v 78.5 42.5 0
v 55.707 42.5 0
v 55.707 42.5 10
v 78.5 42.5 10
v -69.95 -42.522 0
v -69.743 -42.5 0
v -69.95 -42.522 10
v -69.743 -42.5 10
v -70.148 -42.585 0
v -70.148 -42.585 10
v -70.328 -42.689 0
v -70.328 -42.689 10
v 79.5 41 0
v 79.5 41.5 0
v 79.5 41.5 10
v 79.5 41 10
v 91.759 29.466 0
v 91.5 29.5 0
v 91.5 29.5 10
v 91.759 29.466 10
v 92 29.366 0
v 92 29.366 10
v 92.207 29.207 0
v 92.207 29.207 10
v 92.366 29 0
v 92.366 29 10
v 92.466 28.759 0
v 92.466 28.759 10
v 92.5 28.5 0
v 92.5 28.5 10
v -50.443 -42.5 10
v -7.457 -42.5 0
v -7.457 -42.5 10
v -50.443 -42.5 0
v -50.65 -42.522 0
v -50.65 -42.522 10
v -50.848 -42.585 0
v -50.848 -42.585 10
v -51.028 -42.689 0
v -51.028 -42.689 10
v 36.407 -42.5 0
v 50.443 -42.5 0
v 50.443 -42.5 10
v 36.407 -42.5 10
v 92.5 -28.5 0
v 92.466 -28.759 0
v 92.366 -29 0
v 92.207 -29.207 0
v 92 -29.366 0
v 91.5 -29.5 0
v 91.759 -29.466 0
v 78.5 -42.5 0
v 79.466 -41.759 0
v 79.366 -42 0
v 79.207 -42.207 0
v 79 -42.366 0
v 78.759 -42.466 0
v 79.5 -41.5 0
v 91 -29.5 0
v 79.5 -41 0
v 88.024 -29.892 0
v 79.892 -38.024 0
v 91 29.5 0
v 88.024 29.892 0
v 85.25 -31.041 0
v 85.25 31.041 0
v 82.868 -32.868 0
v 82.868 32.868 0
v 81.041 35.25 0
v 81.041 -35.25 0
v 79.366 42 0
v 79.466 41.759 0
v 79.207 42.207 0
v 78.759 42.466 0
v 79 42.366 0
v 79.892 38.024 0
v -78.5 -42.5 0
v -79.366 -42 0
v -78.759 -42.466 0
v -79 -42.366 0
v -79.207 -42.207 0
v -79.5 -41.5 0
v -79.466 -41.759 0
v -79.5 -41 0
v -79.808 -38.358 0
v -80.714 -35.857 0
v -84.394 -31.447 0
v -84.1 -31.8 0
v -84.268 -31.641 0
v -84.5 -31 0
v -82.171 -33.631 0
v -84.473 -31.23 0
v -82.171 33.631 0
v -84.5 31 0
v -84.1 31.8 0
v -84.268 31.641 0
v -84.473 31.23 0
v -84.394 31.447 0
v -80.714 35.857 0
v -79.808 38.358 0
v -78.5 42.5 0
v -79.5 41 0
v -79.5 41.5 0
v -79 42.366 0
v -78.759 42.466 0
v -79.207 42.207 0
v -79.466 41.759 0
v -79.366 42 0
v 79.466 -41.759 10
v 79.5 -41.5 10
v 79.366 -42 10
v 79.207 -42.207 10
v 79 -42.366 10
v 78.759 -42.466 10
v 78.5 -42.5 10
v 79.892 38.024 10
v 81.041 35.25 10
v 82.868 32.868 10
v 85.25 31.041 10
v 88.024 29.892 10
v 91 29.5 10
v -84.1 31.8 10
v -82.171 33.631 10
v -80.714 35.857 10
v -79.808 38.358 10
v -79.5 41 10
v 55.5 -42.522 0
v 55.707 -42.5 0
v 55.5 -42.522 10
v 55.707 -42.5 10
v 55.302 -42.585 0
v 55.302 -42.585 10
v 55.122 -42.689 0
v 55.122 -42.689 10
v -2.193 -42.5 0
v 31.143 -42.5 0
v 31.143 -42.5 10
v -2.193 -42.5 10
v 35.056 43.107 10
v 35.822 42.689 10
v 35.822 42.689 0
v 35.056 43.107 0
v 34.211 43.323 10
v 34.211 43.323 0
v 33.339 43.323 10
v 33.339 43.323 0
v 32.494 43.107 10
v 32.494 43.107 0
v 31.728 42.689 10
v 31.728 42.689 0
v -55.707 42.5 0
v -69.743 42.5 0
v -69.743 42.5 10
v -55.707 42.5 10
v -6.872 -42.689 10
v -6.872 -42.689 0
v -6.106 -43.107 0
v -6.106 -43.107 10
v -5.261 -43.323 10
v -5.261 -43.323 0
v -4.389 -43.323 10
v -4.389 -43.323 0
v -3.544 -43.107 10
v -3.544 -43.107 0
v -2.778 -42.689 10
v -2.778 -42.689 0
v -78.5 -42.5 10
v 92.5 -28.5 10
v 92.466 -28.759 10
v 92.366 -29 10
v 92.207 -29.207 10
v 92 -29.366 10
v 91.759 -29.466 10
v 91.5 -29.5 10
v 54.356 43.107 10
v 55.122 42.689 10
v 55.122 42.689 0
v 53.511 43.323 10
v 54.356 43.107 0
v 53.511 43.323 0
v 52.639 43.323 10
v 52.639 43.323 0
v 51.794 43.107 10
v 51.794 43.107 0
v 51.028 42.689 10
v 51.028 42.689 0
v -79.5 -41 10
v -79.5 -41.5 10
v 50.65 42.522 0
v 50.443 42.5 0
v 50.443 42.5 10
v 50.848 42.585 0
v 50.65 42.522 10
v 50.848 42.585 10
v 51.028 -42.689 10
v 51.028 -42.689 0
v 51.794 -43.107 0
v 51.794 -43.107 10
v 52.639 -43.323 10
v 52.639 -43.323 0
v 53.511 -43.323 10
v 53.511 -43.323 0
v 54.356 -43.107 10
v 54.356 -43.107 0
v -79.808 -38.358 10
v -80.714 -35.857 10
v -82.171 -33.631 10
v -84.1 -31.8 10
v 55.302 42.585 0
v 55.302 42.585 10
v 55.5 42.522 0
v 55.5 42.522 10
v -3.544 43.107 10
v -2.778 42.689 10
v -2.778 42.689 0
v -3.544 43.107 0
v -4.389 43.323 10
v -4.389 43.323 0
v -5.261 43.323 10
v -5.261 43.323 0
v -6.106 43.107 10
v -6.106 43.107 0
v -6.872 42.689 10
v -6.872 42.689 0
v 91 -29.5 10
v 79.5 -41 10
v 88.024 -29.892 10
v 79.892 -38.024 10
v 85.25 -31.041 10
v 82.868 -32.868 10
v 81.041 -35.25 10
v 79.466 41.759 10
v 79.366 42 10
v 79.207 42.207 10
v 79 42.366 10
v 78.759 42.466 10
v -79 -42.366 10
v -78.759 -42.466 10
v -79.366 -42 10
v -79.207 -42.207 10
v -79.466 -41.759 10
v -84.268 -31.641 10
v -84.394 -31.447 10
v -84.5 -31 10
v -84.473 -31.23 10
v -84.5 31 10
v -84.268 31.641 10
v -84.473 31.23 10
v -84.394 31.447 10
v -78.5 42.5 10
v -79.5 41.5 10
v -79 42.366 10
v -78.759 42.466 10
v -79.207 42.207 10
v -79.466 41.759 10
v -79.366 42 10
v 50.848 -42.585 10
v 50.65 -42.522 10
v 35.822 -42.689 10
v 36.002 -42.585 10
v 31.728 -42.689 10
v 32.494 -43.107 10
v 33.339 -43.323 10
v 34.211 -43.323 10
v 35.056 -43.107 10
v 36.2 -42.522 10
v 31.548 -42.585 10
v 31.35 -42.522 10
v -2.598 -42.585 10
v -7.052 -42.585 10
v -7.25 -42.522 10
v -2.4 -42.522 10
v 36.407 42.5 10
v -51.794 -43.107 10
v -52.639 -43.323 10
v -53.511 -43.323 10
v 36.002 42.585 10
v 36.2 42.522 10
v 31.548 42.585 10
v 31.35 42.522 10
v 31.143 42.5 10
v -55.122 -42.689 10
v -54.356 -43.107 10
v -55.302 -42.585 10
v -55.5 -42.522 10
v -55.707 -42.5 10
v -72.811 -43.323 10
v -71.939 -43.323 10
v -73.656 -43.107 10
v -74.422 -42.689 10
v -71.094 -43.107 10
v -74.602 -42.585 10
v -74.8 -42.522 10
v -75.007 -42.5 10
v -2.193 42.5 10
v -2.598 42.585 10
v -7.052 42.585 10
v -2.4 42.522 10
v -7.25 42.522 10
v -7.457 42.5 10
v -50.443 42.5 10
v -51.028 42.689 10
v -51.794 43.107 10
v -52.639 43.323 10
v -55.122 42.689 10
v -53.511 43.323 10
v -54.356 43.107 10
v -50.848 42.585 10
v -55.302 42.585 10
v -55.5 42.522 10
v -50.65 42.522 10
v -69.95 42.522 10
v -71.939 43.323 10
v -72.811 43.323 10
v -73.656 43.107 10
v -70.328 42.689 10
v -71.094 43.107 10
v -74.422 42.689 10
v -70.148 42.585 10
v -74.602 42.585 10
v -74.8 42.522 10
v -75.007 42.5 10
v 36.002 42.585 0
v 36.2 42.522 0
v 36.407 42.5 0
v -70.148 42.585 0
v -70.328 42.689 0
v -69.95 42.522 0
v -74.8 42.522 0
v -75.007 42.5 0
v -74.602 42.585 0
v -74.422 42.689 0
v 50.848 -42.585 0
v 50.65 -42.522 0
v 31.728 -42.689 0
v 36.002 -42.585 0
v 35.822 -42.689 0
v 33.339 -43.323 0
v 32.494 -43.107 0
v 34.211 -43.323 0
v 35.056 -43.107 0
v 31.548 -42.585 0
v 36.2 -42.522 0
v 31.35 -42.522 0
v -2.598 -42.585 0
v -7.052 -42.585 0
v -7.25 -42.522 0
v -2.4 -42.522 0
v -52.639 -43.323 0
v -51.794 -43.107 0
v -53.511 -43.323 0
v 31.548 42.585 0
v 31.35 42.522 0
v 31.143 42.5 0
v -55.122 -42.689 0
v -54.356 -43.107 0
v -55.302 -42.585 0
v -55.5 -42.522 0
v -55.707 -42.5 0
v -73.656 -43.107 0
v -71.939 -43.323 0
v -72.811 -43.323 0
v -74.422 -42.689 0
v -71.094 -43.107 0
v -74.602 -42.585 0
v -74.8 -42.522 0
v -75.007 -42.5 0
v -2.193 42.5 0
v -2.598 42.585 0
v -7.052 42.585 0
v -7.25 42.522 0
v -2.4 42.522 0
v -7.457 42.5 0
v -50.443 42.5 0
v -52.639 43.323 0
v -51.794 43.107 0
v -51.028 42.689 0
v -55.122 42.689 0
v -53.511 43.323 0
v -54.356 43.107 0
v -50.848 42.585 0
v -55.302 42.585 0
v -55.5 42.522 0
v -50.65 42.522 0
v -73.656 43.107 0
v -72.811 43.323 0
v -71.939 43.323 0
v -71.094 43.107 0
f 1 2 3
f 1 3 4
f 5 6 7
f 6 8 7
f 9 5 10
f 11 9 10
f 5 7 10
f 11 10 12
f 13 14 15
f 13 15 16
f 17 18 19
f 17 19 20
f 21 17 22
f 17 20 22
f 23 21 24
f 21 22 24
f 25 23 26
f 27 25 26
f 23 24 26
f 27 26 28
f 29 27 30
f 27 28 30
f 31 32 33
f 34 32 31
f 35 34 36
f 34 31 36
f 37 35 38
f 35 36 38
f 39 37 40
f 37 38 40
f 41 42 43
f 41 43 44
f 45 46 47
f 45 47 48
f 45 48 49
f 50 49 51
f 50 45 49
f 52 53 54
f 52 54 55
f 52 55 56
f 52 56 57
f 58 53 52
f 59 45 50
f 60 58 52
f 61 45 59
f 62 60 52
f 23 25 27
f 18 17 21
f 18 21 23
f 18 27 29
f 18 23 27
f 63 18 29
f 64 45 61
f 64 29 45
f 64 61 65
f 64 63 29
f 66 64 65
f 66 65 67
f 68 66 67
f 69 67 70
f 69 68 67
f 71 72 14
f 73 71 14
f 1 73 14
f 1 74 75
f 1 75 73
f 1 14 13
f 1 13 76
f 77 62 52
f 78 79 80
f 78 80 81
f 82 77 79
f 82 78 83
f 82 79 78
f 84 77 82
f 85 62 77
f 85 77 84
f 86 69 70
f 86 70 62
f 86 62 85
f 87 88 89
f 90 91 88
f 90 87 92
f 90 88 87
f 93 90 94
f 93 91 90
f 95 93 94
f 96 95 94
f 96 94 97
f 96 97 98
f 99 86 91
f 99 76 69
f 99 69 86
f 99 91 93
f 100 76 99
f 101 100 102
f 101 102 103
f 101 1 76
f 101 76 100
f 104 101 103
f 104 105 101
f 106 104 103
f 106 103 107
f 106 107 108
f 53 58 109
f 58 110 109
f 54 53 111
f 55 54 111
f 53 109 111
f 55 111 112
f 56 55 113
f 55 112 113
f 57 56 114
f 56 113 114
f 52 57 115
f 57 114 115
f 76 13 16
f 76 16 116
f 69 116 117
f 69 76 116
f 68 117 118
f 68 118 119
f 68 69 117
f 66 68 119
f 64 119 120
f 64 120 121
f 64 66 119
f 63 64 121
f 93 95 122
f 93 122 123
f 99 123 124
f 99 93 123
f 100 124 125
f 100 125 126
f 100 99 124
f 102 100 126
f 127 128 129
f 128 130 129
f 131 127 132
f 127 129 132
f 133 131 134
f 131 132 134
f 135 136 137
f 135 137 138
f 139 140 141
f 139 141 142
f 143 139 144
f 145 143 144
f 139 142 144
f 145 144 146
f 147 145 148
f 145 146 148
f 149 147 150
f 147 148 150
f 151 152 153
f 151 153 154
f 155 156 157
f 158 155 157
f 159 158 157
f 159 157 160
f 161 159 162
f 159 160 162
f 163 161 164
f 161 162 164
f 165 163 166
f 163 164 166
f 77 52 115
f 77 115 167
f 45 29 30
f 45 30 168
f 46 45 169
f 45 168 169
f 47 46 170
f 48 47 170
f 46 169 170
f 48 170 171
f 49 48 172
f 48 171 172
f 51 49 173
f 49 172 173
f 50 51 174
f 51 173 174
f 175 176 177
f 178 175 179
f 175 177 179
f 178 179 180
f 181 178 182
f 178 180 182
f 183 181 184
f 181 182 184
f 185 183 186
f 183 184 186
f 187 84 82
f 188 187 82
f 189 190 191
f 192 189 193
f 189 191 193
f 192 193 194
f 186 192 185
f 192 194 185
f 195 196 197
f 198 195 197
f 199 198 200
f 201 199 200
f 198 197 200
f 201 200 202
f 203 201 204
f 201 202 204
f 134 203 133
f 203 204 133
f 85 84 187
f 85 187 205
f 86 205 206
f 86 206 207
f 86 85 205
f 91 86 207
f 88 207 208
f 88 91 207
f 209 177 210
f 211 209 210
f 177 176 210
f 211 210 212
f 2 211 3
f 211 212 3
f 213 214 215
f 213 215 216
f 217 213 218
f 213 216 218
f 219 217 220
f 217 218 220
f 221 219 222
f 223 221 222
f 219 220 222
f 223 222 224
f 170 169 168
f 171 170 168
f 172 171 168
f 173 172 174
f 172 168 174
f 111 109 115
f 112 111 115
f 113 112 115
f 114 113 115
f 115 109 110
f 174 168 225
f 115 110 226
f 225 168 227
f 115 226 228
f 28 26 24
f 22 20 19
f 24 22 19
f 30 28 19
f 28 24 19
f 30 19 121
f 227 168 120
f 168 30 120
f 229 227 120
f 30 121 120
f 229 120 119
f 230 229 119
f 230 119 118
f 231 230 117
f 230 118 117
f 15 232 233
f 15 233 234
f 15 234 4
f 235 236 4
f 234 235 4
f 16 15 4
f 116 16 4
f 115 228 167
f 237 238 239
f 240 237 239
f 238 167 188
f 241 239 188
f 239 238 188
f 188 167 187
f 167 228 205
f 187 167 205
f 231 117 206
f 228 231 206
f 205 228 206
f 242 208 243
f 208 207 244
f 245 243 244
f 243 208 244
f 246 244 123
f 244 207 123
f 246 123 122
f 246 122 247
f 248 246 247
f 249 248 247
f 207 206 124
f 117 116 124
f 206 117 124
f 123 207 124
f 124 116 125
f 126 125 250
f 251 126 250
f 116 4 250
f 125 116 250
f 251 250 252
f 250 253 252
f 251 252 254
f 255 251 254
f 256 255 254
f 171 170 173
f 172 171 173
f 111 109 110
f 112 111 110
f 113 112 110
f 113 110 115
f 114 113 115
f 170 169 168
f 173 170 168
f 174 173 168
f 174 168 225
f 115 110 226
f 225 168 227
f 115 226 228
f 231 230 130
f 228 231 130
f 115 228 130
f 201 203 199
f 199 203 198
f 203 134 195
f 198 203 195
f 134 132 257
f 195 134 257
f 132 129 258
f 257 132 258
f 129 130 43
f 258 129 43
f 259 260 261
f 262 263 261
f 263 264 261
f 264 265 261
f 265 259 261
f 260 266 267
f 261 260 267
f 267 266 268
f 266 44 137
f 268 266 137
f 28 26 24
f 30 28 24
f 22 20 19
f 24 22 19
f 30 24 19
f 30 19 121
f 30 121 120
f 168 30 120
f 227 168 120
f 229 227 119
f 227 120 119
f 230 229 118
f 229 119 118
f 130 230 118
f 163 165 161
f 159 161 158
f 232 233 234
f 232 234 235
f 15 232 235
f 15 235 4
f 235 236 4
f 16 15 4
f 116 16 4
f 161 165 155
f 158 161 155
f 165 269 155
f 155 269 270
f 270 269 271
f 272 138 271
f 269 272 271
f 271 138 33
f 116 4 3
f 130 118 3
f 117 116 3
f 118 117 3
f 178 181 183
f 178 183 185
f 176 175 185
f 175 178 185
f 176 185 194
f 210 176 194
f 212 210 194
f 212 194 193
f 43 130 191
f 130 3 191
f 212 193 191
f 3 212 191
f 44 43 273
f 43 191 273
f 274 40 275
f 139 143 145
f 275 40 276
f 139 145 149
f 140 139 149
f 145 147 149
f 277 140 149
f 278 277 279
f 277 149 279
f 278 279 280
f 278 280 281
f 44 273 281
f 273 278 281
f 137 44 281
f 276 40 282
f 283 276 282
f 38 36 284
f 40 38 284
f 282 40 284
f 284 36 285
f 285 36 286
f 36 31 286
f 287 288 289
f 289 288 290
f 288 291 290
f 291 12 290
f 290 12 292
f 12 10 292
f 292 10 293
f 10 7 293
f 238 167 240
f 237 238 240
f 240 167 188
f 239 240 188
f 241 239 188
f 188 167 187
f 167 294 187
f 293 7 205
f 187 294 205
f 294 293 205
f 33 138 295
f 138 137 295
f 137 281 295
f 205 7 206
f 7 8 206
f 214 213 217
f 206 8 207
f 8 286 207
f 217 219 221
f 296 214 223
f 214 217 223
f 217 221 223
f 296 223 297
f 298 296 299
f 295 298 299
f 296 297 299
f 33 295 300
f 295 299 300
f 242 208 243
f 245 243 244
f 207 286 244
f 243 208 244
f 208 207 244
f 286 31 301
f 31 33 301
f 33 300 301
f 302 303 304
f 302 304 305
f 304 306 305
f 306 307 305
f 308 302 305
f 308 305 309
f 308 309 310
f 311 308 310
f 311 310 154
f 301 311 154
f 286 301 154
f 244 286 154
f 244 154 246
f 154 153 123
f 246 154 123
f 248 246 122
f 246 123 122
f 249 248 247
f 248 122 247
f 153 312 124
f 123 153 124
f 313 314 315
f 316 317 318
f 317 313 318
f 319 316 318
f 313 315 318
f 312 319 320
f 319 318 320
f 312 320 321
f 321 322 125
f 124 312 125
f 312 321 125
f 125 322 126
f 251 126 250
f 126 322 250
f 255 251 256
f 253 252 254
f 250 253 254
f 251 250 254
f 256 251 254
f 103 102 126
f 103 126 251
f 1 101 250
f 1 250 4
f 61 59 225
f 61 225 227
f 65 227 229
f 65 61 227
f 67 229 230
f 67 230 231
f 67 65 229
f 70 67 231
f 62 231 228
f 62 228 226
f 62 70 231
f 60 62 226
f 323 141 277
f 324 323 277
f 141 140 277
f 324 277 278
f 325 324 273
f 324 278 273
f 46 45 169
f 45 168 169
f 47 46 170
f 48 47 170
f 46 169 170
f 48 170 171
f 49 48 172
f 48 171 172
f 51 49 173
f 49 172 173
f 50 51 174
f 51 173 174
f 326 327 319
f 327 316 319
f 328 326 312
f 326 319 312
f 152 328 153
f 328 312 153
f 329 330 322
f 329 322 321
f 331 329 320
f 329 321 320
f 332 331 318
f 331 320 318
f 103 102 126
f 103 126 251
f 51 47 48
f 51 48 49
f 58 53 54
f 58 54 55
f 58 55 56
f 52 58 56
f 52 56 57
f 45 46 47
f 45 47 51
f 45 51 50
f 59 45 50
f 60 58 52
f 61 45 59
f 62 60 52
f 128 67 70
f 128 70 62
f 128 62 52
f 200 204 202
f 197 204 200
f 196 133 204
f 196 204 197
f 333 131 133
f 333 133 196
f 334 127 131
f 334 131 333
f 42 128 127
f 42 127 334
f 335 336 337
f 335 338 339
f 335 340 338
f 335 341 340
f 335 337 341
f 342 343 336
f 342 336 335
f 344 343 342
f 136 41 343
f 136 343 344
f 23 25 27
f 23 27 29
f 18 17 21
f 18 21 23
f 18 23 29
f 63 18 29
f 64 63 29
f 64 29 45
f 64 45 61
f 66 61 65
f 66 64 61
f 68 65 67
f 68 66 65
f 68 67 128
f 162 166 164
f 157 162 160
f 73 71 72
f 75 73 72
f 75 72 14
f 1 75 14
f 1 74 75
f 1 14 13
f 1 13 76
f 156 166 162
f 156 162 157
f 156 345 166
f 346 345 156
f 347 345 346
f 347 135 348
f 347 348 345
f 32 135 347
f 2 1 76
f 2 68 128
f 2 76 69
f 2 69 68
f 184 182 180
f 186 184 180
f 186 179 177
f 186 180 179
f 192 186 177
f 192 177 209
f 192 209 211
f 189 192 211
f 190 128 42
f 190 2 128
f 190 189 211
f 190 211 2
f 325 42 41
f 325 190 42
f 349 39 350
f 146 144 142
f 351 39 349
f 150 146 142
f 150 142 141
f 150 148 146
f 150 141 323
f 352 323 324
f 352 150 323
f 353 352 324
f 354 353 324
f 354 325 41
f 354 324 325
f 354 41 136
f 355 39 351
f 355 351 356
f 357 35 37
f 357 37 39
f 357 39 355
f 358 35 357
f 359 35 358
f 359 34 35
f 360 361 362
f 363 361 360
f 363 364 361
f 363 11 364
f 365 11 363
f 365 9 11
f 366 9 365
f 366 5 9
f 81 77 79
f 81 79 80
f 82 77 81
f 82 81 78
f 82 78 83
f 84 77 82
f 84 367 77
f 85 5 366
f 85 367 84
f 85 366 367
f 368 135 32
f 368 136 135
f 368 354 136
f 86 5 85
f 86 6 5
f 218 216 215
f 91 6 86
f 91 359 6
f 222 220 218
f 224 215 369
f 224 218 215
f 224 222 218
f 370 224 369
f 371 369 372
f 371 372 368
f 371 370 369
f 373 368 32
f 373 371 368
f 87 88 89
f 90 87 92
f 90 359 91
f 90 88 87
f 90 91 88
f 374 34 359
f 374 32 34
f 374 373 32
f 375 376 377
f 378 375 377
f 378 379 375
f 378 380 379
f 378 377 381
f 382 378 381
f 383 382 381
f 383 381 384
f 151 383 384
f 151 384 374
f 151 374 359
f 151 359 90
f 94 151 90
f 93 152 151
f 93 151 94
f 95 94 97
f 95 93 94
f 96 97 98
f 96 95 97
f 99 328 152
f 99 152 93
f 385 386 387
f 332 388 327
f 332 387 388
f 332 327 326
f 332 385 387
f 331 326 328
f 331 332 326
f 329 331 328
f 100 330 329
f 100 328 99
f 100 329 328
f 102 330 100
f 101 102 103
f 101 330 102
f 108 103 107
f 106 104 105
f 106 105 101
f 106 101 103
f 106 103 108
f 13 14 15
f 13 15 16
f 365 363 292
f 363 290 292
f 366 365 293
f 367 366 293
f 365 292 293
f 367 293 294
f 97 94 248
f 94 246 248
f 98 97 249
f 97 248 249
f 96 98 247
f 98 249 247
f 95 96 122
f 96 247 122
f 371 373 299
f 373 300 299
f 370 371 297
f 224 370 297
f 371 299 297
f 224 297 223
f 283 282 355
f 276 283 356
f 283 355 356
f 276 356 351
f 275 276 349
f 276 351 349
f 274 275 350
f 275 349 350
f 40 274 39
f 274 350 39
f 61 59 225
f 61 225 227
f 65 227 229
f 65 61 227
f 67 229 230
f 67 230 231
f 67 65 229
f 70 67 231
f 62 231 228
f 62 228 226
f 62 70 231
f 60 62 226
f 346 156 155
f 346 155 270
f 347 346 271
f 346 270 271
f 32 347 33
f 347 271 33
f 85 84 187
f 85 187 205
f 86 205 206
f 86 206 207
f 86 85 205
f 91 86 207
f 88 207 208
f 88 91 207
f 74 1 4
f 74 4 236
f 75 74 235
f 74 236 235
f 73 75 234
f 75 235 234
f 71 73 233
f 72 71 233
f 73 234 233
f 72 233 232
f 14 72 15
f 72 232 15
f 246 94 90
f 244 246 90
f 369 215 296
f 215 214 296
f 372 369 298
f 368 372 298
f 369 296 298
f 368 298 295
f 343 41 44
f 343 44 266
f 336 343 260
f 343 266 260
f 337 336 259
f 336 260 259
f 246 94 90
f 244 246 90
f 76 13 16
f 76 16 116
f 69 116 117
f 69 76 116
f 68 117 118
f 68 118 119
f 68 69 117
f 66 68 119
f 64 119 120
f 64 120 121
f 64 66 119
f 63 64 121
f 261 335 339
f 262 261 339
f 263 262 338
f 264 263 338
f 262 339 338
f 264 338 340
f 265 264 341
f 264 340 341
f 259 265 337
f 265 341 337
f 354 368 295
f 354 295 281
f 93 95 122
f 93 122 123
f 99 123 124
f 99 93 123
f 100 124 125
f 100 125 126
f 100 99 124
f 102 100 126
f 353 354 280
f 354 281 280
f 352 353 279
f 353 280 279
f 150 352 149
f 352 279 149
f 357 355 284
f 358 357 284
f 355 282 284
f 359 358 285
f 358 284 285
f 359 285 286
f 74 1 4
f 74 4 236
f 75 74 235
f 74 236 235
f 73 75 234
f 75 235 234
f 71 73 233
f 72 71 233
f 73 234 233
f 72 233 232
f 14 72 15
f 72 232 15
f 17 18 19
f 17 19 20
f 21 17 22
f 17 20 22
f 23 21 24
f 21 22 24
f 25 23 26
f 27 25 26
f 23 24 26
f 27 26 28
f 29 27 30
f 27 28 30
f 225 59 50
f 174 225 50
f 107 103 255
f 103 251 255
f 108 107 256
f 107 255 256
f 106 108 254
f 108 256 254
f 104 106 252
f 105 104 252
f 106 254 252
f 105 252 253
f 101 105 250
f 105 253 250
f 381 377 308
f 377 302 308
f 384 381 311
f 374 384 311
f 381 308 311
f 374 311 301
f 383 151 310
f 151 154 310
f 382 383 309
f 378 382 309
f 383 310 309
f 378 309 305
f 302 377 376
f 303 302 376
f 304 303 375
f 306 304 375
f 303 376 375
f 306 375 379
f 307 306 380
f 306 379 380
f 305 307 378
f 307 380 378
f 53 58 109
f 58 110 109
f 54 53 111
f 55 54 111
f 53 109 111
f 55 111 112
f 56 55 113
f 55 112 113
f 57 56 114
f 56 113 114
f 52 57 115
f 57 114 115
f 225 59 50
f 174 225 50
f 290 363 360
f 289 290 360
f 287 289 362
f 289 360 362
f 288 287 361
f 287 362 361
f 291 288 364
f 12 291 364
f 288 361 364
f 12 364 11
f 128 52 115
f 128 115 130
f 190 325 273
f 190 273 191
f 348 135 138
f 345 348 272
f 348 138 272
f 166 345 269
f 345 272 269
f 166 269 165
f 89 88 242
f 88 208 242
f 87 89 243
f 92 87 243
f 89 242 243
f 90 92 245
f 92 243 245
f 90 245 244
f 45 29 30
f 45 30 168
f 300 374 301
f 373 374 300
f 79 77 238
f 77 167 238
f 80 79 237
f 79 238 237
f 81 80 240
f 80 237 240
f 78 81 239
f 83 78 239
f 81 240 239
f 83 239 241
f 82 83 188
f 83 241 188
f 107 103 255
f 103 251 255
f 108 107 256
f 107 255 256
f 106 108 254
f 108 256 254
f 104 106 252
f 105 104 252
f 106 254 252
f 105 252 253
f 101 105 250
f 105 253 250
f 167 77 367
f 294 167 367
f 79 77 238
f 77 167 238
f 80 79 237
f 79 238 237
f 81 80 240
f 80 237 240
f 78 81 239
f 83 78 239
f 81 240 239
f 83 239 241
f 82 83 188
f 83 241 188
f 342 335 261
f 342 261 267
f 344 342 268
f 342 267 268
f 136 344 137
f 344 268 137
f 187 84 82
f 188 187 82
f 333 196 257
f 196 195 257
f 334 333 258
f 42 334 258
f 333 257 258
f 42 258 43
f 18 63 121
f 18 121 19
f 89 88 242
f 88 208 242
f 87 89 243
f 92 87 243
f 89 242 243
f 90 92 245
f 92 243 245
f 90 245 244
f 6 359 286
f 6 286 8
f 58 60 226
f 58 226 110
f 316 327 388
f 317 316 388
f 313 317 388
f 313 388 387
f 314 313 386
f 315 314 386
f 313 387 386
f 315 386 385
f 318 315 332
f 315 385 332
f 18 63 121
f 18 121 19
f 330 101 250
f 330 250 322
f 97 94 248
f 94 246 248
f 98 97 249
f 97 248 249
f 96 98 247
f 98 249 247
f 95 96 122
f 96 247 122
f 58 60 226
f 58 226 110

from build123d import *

# Parameters (mm, degrees)
PAD_DEPTH    = 10
FILLET_R     = 1
PAD001_DEPTH = 10
FILLET001_R  = 1


with BuildPart() as body:
    # Sketch → Pad (new body)
    with BuildSketch(Plane.XY):
        with BuildLine():
            ThreePointArc((79.5, 41), (82.868272, 32.868272), (91, 29.5))
            Line((91, 29.5), (92.5, 29.5))
            Line((92.5, 29.5), (92.5, -29.5))
            Line((91, -29.5), (92.5, -29.5))
            ThreePointArc((91, -29.5), (82.868272, -32.868272), (79.5, -41))
            Line((79.5, -41), (79.5, -42.5))
            Line((79.5, -42.5), (55.361373, -42.5))
            ThreePointArc((50.788627, -42.5), (53.075, -43.35), (55.361373, -42.5))
            Line((50.788627, -42.5), (36.061373, -42.5))
            ThreePointArc((31.488627, -42.5), (33.775, -43.35), (36.061373, -42.5))
            Line((31.488627, -42.5), (-2.538627, -42.5))
            ThreePointArc((-7.111373, -42.5), (-4.825, -43.35), (-2.538627, -42.5))
            Line((-7.111373, -42.5), (-50.788627, -42.5))
            ThreePointArc((-55.361373, -42.5), (-53.075, -43.35), (-50.788627, -42.5))
            Line((-55.361373, -42.5), (-70.088627, -42.5))
            ThreePointArc((-74.661373, -42.5), (-72.375, -43.35), (-70.088627, -42.5))
            Line((-79.5, -42.5), (-74.661373, -42.5))
            Line((-79.5, -41), (-79.5, -42.5))
            ThreePointArc((-79.5, -41), (-80.826505, -35.638097), (-84.5, -31.513167))
            Line((-84.5, 31.513167), (-84.5, -31.513167))
            ThreePointArc((-84.5, 31.513167), (-80.826505, 35.638097), (-79.5, 41))
            Line((-79.5, 41), (-79.5, 42.5))
            Line((-79.5, 42.5), (-74.661373, 42.5))
            ThreePointArc((-70.088627, 42.5), (-72.375, 43.35), (-74.661373, 42.5))
            Line((-70.088627, 42.5), (-55.361373, 42.5))
            ThreePointArc((-50.788627, 42.5), (-53.075, 43.35), (-55.361373, 42.5))
            Line((-50.788627, 42.5), (-7.111373, 42.5))
            ThreePointArc((-2.538627, 42.5), (-4.825, 43.35), (-7.111373, 42.5))
            Line((-2.538627, 42.5), (31.488627, 42.5))
            ThreePointArc((36.061373, 42.5), (33.775, 43.35), (31.488627, 42.5))
            Line((36.061373, 42.5), (50.788627, 42.5))
            ThreePointArc((55.361373, 42.5), (53.075, 43.35), (50.788627, 42.5))
            Line((55.361373, 42.5), (79.5, 42.5))
            Line((79.5, 42.5), (79.5, 41))
        make_face()
    extrude(amount=PAD_DEPTH)

    # Fillet
    fillet_edges = [body.edges().sort_by_distance(p)[0] for p in [
        (-84.5, -31.513167, 5),
        (-79.5, -42.5, 5),
        (79.5, -42.5, 5),
        (92.5, -29.5, 5),
        (-84.5, 31.513167, 5),
        (-79.5, 42.5, 5),
        (79.5, 42.5, 5),
        (92.5, 29.5, 5),
        (-74.661373, 42.5, 5),
        (-70.088627, 42.5, 5),
        (-55.361373, 42.5, 5),
        (-50.788627, 42.5, 5),
        (-7.111373, 42.5, 5),
        (-2.538627, 42.5, 5),
        (31.488627, 42.5, 5),
        (36.061373, 42.5, 5),
        (50.788627, 42.5, 5),
        (55.361373, 42.5, 5),
        (-74.661373, -42.5, 5),
        (-70.088627, -42.5, 5),
        (-55.361373, -42.5, 5),
        (-50.788627, -42.5, 5),
        (-7.111373, -42.5, 5),
        (-2.538627, -42.5, 5),
        (31.488627, -42.5, 5),
        (36.061373, -42.5, 5),
        (50.788627, -42.5, 5),
        (55.361373, -42.5, 5),
    ]]
    fillet(fillet_edges, radius=FILLET_R)


with BuildPart() as body001:
    # Sketch001 → Pad001 (new body)
    with BuildSketch(Plane.XY):
        with BuildLine():
            ThreePointArc((79.5, 41), (82.868272, 32.868272), (91, 29.5))
            Line((91, 29.5), (92.5, 29.5))
            Line((92.5, 29.5), (92.5, -29.5))
            Line((91, -29.5), (92.5, -29.5))
            ThreePointArc((91, -29.5), (82.868272, -32.868272), (79.5, -41))
            Line((79.5, -41), (79.5, -42.5))
            Line((79.5, -42.5), (-79.5, -42.5))
            Line((-79.5, -41), (-79.5, -42.5))
            ThreePointArc((-79.5, -41), (-80.826505, -35.638097), (-84.5, -31.513167))
            Line((-84.5, 31.513167), (-84.5, -31.513167))
            ThreePointArc((-84.5, 31.513167), (-80.826505, 35.638097), (-79.5, 41))
            Line((-79.5, 41), (-79.5, 42.5))
            Line((-79.5, 42.5), (79.5, 42.5))
            Line((79.5, 42.5), (79.5, 41))
        make_face()
    extrude(amount=PAD001_DEPTH)

    # Fillet001
    fillet001_edges = [body001.edges().sort_by_distance(p)[0] for p in [
        (-84.5, -31.513167, 5),
        (-79.5, -42.5, 5),
        (79.5, -42.5, 5),
        (92.5, -29.5, 5),
        (-84.5, 31.513167, 5),
        (-79.5, 42.5, 5),
        (79.5, 42.5, 5),
        (92.5, 29.5, 5),
    ]]
    fillet(fillet001_edges, radius=FILLET001_R)


solid = Compound([body.part, body001.part])
